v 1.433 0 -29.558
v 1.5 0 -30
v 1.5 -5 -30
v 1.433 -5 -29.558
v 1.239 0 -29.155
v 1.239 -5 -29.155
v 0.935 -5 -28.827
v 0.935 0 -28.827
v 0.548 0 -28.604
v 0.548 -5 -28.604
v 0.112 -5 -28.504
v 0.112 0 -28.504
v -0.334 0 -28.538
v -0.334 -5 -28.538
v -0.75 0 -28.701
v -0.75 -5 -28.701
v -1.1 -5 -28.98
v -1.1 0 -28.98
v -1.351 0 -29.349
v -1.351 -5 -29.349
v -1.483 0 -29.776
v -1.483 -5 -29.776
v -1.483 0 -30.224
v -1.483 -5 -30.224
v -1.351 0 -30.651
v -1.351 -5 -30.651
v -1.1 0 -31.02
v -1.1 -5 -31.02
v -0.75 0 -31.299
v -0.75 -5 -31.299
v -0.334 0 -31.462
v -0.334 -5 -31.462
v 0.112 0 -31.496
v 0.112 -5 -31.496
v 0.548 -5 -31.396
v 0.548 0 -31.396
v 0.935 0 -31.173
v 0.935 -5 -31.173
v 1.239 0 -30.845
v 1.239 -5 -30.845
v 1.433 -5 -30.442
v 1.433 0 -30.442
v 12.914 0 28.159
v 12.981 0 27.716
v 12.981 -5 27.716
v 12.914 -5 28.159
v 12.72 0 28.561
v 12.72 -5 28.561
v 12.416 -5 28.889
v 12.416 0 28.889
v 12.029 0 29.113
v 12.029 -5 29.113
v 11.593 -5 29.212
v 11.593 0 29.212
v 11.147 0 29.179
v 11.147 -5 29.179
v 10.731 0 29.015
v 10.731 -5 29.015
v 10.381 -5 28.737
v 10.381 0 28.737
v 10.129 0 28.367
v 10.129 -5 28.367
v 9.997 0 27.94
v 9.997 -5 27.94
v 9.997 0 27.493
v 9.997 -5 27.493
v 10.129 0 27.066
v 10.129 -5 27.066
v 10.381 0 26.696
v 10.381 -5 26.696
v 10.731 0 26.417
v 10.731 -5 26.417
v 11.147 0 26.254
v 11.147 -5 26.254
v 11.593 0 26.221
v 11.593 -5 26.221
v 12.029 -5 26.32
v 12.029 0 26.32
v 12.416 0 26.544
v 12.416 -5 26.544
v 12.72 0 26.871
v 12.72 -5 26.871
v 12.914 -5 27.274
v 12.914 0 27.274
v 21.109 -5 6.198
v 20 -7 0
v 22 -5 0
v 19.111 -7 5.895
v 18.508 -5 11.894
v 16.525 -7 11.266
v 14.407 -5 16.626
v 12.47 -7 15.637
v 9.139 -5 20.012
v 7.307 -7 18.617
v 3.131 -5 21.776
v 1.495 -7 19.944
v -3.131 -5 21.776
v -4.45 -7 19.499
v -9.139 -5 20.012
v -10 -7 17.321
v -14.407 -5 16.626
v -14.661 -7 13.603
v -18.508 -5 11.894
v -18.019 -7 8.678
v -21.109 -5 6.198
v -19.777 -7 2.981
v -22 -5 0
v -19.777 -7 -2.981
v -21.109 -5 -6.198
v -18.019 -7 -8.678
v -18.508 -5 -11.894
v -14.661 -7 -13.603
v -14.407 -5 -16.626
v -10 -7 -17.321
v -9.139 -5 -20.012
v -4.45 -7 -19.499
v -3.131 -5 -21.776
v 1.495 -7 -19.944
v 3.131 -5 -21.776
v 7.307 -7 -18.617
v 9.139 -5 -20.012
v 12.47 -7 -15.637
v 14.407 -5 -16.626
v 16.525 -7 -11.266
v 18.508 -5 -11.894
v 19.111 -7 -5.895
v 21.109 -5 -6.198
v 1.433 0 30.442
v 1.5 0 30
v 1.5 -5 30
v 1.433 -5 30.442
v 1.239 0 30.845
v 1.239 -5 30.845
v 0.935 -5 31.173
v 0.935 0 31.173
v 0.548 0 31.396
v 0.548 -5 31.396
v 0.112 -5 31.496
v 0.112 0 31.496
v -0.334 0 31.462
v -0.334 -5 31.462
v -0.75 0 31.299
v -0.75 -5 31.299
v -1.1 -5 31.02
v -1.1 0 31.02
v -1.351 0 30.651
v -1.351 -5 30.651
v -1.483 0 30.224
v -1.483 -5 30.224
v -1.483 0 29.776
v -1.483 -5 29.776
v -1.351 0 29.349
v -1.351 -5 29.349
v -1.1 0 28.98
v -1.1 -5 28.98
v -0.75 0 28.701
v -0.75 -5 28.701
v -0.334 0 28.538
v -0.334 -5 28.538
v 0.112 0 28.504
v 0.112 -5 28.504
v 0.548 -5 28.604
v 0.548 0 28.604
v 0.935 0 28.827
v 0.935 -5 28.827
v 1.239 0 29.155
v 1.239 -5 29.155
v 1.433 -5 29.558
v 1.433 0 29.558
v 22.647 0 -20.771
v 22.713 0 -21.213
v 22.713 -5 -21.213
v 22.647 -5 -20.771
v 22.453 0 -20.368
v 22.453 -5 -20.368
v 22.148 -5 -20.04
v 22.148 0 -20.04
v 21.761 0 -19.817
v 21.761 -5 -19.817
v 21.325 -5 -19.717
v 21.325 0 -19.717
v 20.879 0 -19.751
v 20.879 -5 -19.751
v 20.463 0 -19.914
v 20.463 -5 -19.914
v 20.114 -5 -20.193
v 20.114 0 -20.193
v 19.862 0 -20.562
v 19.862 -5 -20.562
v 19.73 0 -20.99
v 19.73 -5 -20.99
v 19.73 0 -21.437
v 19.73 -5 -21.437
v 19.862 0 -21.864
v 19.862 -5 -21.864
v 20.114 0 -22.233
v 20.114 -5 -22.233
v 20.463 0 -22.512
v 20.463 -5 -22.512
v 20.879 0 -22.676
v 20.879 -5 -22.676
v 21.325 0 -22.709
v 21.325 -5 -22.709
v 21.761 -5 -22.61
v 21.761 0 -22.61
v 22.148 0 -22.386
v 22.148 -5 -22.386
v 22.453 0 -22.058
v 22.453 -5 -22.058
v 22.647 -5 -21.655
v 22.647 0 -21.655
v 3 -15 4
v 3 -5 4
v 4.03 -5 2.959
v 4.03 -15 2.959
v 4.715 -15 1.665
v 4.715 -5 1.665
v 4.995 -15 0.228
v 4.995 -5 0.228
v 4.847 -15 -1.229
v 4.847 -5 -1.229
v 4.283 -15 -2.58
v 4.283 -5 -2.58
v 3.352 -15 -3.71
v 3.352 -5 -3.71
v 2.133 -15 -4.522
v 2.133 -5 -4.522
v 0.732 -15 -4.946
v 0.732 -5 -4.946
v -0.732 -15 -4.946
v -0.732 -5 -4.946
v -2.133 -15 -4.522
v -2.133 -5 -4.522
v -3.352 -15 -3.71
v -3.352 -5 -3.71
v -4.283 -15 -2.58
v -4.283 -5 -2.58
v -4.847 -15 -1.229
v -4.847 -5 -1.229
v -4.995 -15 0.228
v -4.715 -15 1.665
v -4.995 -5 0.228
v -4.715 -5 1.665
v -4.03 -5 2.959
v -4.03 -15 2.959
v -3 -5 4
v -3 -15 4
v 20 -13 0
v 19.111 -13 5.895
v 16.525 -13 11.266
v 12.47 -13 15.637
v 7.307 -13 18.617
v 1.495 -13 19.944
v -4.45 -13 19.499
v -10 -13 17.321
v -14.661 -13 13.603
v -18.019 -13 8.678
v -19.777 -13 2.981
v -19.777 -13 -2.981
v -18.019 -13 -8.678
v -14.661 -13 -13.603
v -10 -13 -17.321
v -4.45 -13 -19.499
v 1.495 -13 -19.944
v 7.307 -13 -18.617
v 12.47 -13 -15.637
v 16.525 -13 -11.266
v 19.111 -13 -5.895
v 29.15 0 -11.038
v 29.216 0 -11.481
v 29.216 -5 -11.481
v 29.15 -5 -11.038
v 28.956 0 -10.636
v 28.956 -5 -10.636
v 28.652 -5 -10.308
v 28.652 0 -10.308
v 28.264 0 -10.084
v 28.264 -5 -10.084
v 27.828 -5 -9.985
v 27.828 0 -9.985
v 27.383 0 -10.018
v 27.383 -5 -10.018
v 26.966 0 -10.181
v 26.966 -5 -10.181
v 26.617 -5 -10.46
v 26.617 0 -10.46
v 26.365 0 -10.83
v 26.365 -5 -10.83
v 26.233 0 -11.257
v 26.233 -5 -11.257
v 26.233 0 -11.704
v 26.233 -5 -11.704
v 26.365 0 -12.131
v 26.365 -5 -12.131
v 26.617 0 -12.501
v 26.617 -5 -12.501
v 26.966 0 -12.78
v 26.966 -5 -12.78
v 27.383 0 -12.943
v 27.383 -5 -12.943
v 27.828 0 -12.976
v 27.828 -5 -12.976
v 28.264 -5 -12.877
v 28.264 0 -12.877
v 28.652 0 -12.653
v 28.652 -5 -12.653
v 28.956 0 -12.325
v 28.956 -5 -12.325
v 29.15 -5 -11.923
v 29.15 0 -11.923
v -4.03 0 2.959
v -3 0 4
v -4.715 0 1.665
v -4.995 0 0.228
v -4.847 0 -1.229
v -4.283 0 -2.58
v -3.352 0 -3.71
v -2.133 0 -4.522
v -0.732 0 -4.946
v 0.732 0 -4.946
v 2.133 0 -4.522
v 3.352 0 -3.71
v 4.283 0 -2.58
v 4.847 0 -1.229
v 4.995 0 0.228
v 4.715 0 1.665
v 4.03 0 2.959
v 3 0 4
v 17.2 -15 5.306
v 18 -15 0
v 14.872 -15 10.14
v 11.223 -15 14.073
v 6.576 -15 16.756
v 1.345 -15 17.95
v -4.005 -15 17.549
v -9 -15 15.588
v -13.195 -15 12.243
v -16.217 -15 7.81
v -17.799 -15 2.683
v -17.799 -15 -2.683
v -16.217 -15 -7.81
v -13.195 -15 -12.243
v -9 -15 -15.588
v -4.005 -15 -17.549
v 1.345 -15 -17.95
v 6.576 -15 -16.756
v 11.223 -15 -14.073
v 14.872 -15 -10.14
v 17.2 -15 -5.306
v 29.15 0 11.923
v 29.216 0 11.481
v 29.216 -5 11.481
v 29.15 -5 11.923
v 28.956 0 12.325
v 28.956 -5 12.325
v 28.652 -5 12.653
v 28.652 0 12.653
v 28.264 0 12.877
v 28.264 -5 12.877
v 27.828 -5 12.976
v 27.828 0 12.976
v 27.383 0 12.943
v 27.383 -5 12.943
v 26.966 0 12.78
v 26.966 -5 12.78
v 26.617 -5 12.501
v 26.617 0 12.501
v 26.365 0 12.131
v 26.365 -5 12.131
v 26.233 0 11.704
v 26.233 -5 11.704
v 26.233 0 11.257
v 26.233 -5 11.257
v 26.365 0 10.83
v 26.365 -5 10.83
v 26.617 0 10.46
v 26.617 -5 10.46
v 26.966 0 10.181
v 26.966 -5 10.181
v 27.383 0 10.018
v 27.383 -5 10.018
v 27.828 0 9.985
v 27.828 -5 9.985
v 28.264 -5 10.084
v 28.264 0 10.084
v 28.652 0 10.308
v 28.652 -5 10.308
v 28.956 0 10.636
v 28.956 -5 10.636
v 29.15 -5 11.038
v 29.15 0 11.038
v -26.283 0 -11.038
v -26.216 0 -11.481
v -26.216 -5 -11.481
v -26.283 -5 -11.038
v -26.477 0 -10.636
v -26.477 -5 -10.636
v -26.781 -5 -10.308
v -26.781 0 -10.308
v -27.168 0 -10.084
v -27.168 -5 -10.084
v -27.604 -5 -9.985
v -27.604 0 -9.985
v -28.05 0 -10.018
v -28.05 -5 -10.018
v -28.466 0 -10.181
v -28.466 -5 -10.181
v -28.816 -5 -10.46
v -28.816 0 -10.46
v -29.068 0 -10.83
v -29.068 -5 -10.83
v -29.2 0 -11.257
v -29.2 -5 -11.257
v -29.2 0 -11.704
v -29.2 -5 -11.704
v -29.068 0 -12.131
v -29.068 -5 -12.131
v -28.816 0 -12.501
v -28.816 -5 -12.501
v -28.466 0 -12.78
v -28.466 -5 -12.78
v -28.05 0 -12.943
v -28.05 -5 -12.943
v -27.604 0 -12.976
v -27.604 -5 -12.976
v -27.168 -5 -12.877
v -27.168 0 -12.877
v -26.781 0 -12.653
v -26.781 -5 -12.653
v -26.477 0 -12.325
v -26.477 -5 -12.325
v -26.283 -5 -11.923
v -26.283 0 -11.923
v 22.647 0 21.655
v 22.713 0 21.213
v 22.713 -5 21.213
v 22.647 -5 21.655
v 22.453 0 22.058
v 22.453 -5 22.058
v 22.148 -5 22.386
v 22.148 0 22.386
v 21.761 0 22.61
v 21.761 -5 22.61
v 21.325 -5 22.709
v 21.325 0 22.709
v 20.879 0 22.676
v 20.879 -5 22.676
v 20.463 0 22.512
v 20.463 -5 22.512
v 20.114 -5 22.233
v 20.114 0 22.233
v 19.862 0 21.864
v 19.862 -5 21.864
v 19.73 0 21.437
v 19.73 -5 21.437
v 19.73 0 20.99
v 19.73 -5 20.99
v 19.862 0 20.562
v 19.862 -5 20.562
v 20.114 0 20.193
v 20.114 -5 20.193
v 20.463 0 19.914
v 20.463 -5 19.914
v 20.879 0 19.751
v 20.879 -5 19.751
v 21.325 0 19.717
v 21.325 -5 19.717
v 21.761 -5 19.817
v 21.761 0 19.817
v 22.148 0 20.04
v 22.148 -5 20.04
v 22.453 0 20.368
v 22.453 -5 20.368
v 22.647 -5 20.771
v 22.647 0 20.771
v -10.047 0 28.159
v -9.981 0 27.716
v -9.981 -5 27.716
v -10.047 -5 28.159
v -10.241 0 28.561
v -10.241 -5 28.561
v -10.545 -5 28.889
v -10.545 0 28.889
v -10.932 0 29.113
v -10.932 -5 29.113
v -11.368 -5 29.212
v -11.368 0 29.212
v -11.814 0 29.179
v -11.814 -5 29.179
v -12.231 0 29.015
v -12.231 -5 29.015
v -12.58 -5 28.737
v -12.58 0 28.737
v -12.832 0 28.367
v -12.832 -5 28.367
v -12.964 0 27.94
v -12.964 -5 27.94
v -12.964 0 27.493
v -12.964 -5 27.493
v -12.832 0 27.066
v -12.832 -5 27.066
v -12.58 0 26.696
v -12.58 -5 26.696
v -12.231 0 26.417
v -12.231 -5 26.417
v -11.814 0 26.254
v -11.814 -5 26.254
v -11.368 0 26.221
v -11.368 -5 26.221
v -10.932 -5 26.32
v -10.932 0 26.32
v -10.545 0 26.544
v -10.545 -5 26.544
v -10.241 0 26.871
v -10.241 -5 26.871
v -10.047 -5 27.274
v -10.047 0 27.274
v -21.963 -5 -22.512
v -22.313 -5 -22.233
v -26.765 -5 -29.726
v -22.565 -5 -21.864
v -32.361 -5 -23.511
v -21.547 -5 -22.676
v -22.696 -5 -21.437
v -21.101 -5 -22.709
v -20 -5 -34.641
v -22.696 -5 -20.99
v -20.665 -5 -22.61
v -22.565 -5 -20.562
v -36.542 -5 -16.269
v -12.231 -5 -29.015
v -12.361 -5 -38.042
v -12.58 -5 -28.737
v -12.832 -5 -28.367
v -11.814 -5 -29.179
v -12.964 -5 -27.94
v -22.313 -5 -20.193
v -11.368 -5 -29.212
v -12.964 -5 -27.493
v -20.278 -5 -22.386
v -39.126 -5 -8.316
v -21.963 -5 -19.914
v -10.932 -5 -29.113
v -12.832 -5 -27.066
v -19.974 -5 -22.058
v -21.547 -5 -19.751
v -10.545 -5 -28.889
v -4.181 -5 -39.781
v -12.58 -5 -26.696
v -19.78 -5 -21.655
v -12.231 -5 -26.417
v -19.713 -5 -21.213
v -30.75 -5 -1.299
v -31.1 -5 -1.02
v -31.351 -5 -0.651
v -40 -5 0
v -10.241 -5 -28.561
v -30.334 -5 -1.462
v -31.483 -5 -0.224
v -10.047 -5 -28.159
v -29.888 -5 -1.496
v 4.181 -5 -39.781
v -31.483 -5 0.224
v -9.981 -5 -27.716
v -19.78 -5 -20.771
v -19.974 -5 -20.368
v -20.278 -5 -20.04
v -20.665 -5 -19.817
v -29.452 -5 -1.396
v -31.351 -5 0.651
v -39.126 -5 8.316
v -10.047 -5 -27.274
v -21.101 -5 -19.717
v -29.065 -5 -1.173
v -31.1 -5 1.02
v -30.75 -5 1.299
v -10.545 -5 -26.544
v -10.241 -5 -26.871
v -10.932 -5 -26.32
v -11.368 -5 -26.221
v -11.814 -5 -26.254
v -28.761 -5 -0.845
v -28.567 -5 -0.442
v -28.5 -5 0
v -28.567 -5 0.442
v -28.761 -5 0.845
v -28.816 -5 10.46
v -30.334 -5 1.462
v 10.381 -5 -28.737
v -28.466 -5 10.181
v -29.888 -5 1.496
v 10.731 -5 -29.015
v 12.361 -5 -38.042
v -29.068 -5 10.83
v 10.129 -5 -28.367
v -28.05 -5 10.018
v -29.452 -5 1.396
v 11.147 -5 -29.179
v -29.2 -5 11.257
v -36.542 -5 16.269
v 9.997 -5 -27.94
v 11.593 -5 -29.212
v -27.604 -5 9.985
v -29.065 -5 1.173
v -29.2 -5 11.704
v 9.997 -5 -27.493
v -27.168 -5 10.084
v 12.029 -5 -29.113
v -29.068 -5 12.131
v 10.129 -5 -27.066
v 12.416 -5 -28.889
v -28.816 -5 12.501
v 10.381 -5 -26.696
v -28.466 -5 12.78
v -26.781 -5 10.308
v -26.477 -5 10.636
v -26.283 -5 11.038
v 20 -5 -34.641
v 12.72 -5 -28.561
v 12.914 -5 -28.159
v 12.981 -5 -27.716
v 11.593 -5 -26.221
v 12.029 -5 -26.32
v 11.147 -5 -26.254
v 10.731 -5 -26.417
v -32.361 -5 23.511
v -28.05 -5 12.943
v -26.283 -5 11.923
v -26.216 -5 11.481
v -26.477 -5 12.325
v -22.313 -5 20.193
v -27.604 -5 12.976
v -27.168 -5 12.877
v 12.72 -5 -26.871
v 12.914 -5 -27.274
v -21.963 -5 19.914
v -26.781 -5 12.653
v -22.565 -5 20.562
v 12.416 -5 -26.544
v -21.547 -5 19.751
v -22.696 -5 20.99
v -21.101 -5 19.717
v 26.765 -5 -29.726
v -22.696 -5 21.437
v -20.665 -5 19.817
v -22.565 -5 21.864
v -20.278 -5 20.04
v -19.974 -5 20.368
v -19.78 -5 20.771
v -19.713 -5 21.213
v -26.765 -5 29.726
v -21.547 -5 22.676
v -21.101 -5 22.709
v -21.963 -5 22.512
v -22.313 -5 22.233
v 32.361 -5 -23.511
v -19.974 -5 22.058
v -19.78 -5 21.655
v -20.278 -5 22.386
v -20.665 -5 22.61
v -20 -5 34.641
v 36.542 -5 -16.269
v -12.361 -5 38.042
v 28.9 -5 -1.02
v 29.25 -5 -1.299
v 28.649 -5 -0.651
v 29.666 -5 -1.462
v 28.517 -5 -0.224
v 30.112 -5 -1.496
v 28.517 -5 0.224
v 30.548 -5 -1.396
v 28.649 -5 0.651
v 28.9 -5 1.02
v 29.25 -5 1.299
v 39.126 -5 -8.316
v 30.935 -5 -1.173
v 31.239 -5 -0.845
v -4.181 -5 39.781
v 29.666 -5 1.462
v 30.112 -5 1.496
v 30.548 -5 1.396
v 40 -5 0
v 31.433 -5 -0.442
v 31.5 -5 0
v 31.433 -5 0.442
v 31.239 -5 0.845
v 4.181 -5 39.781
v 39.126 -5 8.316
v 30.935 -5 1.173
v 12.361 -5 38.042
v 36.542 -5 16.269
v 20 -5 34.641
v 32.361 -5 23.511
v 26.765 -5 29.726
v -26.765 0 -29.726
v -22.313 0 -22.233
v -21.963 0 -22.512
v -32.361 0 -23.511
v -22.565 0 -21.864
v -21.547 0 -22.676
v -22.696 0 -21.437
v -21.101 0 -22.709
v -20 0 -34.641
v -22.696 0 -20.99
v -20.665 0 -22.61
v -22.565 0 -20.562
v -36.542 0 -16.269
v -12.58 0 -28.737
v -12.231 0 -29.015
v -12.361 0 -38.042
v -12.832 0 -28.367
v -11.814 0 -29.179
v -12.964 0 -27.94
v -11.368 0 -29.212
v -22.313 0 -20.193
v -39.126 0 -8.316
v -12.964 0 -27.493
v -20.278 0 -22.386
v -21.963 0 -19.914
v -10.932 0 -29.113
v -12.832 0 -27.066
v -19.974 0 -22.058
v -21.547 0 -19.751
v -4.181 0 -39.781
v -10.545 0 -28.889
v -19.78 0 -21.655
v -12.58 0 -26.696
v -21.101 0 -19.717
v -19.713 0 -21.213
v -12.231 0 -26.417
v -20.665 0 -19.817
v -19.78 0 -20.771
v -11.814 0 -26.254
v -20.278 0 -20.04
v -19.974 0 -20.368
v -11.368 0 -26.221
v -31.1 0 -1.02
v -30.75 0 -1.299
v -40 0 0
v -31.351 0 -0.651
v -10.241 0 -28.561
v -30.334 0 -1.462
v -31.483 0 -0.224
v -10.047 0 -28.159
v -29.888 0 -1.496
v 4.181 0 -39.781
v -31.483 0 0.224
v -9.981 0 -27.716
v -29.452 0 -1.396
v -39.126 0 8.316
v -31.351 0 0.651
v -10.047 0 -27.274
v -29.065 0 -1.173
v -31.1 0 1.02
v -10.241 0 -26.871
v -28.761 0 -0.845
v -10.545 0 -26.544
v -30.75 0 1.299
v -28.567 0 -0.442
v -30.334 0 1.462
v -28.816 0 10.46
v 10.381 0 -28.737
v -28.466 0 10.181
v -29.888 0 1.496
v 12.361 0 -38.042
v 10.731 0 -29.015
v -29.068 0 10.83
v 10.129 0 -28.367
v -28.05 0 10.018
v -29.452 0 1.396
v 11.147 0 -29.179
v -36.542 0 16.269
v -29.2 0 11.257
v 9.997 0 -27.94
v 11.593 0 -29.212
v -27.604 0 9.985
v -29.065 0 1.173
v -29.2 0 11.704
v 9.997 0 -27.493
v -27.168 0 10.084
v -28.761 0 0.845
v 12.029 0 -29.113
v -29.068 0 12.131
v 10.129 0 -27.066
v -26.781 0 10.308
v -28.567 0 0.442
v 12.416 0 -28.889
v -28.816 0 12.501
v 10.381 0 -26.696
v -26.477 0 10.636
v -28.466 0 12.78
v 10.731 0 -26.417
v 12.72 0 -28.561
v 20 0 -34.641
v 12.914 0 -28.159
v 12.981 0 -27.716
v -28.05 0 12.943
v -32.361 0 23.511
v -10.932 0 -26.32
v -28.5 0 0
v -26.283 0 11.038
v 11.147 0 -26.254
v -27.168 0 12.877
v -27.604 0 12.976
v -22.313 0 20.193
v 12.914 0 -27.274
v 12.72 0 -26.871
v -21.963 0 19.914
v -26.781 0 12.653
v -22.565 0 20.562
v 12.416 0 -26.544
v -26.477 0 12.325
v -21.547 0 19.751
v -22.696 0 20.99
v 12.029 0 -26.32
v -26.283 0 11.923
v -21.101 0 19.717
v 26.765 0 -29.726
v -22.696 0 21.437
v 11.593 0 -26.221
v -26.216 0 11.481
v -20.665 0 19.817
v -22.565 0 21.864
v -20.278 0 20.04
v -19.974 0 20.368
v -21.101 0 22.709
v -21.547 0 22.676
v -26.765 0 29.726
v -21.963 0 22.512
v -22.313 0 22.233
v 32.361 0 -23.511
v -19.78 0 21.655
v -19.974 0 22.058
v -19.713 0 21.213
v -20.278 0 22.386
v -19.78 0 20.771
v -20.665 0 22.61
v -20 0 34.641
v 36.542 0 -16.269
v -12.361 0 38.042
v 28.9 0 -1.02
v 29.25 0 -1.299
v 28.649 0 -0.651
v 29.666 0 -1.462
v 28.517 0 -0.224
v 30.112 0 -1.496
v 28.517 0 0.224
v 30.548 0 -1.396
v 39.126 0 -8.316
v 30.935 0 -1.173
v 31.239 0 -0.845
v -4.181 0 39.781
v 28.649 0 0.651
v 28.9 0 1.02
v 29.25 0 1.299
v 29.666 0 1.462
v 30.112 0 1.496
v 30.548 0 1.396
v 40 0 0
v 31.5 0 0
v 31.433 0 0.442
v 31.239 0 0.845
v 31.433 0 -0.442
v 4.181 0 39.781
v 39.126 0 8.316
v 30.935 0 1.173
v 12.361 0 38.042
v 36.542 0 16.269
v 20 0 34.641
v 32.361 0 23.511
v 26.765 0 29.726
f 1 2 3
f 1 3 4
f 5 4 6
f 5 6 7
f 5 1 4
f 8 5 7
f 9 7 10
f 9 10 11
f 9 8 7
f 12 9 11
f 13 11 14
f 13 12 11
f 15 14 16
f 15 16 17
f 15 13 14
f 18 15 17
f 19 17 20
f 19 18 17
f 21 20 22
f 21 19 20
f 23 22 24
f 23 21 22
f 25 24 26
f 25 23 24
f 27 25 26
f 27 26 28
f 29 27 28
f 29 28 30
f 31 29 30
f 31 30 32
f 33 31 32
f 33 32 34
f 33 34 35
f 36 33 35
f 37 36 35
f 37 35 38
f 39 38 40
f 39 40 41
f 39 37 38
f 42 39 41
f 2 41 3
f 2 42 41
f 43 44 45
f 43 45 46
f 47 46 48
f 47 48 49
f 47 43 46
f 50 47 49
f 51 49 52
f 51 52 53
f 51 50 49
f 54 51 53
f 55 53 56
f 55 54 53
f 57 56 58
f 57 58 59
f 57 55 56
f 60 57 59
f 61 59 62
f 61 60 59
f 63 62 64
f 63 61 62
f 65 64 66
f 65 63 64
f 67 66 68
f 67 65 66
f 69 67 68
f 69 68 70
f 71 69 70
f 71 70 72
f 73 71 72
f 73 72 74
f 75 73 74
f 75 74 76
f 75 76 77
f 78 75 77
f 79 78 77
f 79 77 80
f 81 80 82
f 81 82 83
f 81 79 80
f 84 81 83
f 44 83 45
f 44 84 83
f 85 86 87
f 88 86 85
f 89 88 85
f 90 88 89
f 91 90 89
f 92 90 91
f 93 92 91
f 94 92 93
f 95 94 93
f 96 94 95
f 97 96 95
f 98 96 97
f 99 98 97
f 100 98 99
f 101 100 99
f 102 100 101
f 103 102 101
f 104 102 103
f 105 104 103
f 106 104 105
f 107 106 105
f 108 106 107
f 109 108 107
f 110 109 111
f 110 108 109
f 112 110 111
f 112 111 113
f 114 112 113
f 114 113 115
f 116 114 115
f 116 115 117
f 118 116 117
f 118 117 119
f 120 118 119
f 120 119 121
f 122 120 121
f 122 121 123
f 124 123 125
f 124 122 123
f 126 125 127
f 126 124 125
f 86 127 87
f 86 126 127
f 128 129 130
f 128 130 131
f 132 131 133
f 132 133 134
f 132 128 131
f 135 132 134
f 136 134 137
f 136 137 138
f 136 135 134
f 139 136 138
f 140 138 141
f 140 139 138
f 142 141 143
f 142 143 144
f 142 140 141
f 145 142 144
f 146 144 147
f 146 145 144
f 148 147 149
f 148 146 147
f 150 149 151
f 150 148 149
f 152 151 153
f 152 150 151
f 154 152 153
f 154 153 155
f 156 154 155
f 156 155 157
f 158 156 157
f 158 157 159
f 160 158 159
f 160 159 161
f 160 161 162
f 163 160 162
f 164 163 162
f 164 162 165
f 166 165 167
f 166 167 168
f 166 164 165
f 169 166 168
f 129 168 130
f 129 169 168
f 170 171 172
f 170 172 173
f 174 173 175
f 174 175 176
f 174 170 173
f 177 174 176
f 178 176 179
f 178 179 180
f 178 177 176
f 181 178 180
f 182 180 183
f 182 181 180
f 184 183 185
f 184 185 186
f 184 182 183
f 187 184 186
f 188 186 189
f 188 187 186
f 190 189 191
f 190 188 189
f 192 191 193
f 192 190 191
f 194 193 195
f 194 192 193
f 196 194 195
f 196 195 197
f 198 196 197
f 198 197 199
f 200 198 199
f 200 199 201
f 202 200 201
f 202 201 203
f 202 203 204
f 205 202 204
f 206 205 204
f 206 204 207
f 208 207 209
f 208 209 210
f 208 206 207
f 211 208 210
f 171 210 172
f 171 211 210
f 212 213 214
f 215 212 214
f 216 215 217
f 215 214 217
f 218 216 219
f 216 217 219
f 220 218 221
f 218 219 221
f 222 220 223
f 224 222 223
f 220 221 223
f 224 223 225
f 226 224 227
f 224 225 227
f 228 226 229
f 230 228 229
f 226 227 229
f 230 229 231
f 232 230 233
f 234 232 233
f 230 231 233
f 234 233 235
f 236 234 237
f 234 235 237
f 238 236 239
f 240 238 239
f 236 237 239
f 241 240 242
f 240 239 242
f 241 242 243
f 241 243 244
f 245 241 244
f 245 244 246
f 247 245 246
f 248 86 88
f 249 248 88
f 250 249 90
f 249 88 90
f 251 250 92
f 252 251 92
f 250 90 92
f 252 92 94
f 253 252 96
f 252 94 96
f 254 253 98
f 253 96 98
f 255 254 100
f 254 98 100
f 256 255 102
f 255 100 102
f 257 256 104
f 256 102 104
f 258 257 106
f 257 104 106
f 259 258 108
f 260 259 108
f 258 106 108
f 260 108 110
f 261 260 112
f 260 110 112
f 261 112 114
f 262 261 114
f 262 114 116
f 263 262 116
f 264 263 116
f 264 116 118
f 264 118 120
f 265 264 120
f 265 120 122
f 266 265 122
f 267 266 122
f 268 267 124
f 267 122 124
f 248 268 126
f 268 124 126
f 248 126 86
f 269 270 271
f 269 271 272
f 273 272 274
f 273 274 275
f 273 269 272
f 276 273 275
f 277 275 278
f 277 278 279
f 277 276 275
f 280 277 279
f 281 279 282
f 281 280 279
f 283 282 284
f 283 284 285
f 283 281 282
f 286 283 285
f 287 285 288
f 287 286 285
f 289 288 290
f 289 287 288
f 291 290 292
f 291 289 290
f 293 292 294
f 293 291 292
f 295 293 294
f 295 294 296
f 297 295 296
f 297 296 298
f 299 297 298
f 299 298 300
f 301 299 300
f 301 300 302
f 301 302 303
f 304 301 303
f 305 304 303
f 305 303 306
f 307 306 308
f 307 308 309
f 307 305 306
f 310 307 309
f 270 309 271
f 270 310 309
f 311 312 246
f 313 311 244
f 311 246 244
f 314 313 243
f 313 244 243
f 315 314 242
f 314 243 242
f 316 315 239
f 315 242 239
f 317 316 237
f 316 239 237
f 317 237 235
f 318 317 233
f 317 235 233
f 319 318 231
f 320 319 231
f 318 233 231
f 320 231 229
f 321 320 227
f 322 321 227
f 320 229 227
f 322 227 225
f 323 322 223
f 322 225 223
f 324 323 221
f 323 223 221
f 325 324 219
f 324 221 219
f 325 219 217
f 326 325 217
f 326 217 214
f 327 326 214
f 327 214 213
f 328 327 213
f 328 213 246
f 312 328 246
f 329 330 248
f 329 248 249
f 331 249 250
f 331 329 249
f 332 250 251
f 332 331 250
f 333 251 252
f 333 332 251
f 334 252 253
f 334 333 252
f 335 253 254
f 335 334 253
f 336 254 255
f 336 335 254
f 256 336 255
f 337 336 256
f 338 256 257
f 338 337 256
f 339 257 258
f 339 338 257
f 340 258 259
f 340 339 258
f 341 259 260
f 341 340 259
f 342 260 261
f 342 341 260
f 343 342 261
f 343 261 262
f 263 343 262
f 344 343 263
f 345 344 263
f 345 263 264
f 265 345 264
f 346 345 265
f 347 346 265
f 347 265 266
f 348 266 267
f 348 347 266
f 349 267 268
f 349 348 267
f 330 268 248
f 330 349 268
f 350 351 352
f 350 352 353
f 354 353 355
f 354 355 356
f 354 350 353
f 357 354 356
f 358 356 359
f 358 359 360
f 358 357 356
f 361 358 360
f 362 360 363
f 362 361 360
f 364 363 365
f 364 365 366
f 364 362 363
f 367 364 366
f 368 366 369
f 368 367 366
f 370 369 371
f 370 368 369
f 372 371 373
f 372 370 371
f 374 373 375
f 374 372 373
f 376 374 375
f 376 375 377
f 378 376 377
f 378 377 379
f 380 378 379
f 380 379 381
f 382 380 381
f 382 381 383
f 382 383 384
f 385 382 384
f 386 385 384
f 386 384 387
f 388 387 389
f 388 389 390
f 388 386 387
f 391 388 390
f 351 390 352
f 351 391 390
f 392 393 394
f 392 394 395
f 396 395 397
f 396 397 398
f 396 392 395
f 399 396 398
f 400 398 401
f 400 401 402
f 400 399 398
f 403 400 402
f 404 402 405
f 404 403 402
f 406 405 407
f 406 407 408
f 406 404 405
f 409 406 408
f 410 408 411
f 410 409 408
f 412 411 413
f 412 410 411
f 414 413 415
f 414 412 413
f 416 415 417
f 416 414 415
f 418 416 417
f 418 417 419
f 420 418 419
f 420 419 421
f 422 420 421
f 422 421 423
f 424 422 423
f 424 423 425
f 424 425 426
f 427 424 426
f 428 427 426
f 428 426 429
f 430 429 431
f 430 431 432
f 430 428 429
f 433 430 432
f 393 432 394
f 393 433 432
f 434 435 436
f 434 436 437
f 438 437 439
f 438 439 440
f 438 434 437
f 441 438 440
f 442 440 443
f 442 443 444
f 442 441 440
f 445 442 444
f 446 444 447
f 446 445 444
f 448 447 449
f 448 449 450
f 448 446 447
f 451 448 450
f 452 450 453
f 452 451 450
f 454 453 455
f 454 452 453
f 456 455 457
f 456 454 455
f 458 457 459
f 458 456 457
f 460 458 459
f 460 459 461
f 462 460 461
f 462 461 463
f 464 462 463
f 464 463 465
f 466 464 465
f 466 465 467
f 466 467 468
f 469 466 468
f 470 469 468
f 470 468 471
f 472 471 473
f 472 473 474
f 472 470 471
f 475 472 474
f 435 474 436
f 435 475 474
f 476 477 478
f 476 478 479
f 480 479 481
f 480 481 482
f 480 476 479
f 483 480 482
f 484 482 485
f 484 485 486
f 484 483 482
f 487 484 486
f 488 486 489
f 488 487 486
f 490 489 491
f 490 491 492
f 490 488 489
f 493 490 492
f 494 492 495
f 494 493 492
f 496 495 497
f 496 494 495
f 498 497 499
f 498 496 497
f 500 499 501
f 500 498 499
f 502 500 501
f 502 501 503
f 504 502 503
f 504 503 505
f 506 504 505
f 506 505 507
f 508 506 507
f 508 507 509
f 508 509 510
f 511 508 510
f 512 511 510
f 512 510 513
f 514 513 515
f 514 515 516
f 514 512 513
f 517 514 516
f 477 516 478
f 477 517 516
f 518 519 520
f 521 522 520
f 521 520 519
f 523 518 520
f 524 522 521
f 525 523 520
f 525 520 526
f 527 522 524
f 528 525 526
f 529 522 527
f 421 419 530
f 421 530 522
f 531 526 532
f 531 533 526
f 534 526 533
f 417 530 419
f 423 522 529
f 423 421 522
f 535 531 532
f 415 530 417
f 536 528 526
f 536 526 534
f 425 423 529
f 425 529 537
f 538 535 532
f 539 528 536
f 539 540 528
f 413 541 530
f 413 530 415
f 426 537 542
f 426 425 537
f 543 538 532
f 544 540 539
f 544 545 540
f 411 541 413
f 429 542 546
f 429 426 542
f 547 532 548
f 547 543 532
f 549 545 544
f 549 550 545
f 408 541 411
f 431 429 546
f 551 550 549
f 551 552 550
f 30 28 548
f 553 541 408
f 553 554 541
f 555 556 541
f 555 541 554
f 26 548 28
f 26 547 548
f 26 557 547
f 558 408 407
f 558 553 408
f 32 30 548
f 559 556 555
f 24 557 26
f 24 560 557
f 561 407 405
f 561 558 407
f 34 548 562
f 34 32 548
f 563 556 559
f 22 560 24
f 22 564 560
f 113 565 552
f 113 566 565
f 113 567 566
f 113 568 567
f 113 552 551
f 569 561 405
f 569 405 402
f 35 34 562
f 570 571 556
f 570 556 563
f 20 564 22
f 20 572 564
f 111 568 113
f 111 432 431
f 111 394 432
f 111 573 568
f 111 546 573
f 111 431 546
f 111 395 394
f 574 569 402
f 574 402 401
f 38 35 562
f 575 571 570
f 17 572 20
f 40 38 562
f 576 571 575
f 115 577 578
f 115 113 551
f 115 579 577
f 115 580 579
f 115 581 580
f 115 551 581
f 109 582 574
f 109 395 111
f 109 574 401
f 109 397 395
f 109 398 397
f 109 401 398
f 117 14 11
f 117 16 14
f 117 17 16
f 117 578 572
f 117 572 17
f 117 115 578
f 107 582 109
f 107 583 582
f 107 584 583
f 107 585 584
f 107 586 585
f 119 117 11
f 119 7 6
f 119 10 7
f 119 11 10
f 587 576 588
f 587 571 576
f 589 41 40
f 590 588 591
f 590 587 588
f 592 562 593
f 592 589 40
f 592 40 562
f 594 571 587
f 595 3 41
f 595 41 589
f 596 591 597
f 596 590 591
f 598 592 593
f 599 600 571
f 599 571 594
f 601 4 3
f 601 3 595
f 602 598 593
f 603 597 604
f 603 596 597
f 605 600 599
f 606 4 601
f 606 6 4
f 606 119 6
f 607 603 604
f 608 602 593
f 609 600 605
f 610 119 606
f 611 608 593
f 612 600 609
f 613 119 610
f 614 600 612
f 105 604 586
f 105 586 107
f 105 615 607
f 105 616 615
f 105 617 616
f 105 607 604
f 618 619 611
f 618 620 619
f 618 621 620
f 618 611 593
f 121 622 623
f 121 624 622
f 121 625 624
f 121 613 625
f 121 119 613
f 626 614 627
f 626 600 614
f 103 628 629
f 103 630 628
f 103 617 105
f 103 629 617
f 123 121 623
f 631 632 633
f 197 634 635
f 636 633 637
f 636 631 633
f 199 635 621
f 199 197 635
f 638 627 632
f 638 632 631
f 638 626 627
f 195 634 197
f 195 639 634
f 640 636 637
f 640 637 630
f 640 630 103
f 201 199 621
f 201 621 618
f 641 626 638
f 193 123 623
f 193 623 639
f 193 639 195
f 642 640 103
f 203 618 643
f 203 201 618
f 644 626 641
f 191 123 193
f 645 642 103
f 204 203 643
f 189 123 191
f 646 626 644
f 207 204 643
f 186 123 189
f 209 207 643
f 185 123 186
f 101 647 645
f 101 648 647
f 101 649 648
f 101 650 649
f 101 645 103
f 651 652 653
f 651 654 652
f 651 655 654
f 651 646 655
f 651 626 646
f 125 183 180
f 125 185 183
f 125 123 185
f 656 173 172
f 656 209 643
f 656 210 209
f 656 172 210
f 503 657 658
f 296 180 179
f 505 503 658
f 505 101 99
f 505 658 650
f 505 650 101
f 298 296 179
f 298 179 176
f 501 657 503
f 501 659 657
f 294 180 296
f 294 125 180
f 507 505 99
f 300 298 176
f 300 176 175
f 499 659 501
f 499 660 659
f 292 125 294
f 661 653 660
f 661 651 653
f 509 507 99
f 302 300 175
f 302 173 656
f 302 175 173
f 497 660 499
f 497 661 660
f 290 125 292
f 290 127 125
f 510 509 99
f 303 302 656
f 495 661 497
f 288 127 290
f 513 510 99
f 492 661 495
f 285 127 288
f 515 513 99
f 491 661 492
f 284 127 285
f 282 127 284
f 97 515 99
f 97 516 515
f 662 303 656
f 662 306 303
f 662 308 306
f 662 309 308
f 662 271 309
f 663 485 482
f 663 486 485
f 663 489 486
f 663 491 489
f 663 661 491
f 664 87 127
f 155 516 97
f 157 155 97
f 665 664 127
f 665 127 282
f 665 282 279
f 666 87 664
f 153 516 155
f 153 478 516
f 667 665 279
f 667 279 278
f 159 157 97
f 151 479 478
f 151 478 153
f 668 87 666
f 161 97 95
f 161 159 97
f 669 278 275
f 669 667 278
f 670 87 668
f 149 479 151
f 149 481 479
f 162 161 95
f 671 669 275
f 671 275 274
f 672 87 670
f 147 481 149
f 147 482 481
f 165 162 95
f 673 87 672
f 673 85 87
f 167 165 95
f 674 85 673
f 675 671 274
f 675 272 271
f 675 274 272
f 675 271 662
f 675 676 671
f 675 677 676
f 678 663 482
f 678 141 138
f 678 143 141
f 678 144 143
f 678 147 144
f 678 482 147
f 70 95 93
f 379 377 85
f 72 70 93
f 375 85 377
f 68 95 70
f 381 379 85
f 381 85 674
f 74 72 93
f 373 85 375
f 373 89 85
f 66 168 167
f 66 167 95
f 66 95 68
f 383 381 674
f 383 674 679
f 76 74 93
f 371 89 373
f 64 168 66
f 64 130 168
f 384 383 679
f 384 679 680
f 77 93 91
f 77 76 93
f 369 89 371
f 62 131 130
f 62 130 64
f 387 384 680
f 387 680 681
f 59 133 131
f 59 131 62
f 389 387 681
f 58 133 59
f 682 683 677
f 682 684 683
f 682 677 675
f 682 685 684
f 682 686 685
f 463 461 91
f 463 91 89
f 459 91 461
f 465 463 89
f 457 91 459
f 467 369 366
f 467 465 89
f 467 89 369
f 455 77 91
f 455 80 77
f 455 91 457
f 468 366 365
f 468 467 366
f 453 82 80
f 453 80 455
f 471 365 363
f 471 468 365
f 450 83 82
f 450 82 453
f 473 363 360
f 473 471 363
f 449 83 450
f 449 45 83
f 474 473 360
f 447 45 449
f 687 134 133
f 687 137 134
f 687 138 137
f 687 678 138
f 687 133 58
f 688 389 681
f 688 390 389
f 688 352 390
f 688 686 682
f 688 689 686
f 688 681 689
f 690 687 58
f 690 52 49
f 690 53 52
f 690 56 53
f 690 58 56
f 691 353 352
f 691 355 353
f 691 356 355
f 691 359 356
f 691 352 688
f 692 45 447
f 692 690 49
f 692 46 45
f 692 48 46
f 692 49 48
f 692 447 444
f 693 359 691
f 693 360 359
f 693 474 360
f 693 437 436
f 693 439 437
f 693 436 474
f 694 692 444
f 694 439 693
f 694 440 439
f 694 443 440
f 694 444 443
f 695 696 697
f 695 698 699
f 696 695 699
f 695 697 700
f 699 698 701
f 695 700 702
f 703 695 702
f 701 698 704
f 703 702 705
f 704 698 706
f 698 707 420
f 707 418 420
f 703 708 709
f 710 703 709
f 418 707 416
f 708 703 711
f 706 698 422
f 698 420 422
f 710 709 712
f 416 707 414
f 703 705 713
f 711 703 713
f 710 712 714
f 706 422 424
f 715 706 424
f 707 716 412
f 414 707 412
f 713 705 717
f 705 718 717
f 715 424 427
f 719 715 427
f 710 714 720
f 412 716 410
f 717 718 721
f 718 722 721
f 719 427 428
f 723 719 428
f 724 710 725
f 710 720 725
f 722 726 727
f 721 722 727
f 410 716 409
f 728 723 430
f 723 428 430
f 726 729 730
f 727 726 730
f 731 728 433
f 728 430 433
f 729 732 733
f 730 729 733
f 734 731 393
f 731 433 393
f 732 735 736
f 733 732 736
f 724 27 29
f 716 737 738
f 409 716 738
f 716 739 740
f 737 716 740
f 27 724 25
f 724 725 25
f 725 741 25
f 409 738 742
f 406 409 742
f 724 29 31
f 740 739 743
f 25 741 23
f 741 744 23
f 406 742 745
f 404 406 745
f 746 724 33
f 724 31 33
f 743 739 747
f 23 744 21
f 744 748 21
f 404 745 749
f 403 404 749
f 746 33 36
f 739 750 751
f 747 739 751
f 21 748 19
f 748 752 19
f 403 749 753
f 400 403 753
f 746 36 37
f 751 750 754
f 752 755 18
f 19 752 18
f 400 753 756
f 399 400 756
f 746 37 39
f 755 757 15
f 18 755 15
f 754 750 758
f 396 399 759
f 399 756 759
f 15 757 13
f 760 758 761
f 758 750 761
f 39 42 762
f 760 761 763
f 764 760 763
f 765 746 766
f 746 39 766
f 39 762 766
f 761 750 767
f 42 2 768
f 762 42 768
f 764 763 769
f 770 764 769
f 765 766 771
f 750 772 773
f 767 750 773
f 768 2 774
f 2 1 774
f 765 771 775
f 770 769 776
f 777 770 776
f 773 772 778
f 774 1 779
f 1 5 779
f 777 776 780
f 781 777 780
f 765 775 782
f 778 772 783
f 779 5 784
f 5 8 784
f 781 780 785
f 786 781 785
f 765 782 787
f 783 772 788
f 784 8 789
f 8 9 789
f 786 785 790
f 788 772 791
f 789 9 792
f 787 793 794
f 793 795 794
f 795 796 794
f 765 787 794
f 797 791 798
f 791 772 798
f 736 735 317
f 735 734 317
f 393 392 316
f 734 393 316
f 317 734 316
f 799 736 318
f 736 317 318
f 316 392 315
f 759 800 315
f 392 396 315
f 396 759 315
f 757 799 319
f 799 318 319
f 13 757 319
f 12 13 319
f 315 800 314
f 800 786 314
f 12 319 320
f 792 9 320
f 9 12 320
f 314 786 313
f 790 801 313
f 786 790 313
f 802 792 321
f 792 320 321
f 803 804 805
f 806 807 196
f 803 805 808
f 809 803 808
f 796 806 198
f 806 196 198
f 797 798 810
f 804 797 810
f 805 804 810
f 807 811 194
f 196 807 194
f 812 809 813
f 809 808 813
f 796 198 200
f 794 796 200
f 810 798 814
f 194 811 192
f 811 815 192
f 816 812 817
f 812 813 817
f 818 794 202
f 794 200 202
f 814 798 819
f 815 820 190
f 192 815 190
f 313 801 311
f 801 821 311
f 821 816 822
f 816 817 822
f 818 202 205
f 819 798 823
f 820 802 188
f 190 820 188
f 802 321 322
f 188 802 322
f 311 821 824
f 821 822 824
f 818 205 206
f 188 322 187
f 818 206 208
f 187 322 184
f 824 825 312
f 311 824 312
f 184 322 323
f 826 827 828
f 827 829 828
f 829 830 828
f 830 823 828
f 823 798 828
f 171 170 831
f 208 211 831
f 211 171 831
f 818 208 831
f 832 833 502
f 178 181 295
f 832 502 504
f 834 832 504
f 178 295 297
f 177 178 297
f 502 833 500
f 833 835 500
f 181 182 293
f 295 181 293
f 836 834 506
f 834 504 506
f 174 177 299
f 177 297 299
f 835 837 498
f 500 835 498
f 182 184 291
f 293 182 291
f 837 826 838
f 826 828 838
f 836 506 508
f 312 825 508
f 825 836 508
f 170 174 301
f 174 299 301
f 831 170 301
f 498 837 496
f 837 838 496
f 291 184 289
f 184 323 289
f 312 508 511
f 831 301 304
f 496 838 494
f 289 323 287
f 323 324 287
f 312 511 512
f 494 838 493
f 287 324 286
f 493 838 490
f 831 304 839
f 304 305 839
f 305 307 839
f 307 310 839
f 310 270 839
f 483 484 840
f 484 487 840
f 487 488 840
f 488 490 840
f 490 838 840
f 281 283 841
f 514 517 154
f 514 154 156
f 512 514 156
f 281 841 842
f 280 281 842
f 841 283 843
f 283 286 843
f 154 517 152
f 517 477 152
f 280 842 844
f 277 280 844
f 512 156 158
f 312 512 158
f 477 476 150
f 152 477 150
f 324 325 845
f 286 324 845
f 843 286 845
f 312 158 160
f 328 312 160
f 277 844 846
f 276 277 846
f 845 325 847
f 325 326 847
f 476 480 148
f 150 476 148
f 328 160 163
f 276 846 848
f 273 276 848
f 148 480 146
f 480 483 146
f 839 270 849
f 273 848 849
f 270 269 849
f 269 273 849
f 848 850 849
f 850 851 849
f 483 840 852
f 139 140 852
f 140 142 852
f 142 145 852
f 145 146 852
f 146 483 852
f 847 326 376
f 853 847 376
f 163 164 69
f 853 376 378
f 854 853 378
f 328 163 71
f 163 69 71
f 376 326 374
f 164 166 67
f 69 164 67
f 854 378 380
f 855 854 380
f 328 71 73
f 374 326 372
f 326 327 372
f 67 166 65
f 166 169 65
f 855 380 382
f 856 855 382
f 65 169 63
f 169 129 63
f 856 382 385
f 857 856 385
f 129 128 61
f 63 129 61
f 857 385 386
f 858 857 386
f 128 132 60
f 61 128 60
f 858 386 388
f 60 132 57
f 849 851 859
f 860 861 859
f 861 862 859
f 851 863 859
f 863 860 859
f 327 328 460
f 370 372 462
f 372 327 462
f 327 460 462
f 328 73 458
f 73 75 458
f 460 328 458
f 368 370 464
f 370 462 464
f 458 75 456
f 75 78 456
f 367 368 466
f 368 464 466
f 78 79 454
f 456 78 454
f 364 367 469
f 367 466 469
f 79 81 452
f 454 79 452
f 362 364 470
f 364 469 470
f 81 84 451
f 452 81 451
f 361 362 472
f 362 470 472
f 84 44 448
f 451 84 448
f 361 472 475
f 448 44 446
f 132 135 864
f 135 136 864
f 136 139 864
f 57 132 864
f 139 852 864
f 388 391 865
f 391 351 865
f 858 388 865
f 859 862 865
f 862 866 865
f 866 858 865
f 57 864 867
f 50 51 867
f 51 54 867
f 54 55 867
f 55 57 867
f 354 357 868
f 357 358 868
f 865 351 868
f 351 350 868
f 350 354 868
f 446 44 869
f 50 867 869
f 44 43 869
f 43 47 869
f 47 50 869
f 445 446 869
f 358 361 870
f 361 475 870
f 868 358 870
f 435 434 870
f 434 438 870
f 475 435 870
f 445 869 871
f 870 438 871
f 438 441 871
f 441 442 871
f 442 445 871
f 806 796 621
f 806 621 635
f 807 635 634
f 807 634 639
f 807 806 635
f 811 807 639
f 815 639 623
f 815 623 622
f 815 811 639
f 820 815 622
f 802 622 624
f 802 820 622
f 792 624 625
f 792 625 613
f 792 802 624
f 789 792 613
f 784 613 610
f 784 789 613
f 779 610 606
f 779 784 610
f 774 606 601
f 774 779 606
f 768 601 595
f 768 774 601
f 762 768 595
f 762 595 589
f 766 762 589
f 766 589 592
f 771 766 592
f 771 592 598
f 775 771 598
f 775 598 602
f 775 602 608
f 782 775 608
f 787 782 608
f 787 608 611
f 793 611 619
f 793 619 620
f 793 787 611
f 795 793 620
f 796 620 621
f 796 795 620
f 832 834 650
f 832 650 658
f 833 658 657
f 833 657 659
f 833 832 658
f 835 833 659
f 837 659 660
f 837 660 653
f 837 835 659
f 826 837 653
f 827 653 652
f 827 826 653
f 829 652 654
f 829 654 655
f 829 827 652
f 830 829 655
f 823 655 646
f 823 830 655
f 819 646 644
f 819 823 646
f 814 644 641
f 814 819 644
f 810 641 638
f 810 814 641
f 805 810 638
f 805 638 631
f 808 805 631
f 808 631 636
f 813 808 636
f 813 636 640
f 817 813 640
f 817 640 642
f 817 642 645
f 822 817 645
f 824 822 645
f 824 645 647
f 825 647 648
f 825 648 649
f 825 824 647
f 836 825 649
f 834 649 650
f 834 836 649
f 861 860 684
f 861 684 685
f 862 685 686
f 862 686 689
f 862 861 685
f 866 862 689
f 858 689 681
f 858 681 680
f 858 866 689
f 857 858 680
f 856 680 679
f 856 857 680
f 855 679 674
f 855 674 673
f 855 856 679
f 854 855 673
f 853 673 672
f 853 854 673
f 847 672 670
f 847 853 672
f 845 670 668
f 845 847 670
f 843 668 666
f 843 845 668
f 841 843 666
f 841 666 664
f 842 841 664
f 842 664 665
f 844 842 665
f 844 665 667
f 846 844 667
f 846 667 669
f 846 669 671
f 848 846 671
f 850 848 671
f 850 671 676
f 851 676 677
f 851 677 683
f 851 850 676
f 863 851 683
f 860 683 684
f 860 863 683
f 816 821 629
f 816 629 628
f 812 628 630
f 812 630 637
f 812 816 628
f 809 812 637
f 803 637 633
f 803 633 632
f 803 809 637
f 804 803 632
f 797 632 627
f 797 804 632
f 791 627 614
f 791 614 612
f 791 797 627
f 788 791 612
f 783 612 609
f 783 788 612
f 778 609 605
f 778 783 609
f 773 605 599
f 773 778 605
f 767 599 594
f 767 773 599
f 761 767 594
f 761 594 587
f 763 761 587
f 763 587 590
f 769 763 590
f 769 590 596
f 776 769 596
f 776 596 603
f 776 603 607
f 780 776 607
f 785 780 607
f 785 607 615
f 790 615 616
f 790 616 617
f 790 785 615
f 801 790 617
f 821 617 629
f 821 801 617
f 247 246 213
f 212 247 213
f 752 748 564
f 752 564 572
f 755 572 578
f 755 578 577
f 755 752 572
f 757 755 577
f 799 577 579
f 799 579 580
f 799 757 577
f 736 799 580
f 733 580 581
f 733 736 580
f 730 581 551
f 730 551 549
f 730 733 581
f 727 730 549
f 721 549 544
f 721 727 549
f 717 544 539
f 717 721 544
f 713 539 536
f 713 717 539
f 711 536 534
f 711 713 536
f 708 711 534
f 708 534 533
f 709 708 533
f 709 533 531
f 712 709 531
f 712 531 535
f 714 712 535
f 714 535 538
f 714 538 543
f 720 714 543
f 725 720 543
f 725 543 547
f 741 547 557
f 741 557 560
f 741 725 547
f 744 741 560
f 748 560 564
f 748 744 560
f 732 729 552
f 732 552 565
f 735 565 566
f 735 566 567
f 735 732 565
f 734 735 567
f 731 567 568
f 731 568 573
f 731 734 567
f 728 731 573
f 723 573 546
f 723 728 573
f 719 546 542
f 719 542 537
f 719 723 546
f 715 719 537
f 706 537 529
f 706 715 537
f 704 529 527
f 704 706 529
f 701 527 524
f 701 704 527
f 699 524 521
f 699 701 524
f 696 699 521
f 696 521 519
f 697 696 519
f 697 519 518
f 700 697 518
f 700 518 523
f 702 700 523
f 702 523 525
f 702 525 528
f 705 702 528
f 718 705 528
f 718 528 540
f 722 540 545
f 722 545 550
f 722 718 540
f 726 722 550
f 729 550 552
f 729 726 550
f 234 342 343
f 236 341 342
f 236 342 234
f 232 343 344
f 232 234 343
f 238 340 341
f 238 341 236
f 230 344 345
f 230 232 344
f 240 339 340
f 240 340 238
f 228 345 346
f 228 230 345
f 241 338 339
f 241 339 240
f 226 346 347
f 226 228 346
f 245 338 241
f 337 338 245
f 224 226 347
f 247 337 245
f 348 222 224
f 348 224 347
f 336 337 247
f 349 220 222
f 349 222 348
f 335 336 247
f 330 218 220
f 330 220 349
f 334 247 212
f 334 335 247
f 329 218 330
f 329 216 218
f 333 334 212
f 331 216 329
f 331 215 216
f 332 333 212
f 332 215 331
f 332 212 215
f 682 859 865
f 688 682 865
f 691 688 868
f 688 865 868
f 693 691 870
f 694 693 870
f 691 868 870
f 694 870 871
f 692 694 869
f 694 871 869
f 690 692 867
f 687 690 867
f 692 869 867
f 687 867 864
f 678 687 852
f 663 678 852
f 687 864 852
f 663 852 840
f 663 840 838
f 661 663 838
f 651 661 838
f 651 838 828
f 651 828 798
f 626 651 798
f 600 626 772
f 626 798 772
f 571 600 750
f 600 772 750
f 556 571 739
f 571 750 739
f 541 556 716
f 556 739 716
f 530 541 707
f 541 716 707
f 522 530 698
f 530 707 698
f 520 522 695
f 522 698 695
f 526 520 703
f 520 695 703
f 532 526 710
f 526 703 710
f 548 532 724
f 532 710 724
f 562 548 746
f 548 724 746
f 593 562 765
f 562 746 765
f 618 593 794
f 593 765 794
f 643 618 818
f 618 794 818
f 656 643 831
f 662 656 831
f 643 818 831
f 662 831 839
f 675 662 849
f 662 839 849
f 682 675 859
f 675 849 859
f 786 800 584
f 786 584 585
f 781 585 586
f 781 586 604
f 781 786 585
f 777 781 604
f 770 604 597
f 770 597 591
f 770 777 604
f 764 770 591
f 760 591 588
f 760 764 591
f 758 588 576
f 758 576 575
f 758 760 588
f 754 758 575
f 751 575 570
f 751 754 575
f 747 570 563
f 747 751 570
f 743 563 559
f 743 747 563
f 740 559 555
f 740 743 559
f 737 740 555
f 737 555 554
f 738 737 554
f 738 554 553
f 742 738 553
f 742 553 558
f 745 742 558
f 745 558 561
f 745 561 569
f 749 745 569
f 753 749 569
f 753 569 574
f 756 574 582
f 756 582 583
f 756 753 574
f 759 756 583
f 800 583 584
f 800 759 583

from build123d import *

# Parameters (mm, degrees)
F0_R     = 40
F0_R_2   = 1.5
F1_DEPTH = 5
F2_R     = 20
F3_DEPTH = 10
F4_DEPTH = 5.001
F5_SIZE  = 2


with BuildPart() as f1:
    # F0 (on Front) → F1 (new body)
    with BuildSketch(Plane.XZ):
        Circle(F0_R)
        with Locations((-21.213203, -21.213203)):
            Circle(F0_R_2, mode=Mode.SUBTRACT)
        with Locations((-11.480503, -27.716386)):
            Circle(F0_R_2, mode=Mode.SUBTRACT)
        with Locations((-27.716386, -11.480503)):
            Circle(F0_R_2, mode=Mode.SUBTRACT)
        with Locations((0, -30)):
            Circle(F0_R_2, mode=Mode.SUBTRACT)
        with Locations((11.480503, -27.716386)):
            Circle(F0_R_2, mode=Mode.SUBTRACT)
        with Locations((21.213203, -21.213203)):
            Circle(F0_R_2, mode=Mode.SUBTRACT)
        with Locations((27.716386, -11.480503)):
            Circle(F0_R_2, mode=Mode.SUBTRACT)
        with Locations((-30, 0)):
            Circle(F0_R_2, mode=Mode.SUBTRACT)
        with Locations((-27.716386, 11.480503)):
            Circle(F0_R_2, mode=Mode.SUBTRACT)
        with Locations((-21.213203, 21.213203)):
            Circle(F0_R_2, mode=Mode.SUBTRACT)
        with Locations((-11.480503, 27.716386)):
            Circle(F0_R_2, mode=Mode.SUBTRACT)
        with Locations((30, 0)):
            Circle(F0_R_2, mode=Mode.SUBTRACT)
        with Locations((27.716386, 11.480503)):
            Circle(F0_R_2, mode=Mode.SUBTRACT)
        with Locations((11.480503, 27.716386)):
            Circle(F0_R_2, mode=Mode.SUBTRACT)
        with Locations((0, 30)):
            Circle(F0_R_2, mode=Mode.SUBTRACT)
        with Locations((21.213203, 21.213203)):
            Circle(F0_R_2, mode=Mode.SUBTRACT)
    extrude(amount=F1_DEPTH)

    # F2 (on face) → F3 (join)
    with BuildSketch(Plane.XZ.offset(5)):
        Circle(F2_R)
        with BuildLine():
            ThreePointArc((3, 4), (0, -5), (-3, 4))
            Line((-3, 4), (3, 4))
        make_face(mode=Mode.SUBTRACT)
    extrude(amount=F3_DEPTH)

    # F3_face (on face) → F4 (cut, through all)
    with BuildSketch(Plane(origin=(0, -5, -0.241766), x_dir=(1, 0, 0), z_dir=(0, -1, 0))):
        with BuildLine():
            ThreePointArc((-3, 4.241766), (0, -4.758234), (3, 4.241766))
            Line((3, 4.241766), (-3, 4.241766))
        make_face()
    extrude(amount=-F4_DEPTH, mode=Mode.SUBTRACT)

    # F5
    f5_edges = [f1.edges().sort_by_distance(p)[0] for p in [
        (-20, -15, 0),
        (-20, -5, 0),
    ]]
    chamfer(f5_edges, length=F5_SIZE)


solid = f1.part
